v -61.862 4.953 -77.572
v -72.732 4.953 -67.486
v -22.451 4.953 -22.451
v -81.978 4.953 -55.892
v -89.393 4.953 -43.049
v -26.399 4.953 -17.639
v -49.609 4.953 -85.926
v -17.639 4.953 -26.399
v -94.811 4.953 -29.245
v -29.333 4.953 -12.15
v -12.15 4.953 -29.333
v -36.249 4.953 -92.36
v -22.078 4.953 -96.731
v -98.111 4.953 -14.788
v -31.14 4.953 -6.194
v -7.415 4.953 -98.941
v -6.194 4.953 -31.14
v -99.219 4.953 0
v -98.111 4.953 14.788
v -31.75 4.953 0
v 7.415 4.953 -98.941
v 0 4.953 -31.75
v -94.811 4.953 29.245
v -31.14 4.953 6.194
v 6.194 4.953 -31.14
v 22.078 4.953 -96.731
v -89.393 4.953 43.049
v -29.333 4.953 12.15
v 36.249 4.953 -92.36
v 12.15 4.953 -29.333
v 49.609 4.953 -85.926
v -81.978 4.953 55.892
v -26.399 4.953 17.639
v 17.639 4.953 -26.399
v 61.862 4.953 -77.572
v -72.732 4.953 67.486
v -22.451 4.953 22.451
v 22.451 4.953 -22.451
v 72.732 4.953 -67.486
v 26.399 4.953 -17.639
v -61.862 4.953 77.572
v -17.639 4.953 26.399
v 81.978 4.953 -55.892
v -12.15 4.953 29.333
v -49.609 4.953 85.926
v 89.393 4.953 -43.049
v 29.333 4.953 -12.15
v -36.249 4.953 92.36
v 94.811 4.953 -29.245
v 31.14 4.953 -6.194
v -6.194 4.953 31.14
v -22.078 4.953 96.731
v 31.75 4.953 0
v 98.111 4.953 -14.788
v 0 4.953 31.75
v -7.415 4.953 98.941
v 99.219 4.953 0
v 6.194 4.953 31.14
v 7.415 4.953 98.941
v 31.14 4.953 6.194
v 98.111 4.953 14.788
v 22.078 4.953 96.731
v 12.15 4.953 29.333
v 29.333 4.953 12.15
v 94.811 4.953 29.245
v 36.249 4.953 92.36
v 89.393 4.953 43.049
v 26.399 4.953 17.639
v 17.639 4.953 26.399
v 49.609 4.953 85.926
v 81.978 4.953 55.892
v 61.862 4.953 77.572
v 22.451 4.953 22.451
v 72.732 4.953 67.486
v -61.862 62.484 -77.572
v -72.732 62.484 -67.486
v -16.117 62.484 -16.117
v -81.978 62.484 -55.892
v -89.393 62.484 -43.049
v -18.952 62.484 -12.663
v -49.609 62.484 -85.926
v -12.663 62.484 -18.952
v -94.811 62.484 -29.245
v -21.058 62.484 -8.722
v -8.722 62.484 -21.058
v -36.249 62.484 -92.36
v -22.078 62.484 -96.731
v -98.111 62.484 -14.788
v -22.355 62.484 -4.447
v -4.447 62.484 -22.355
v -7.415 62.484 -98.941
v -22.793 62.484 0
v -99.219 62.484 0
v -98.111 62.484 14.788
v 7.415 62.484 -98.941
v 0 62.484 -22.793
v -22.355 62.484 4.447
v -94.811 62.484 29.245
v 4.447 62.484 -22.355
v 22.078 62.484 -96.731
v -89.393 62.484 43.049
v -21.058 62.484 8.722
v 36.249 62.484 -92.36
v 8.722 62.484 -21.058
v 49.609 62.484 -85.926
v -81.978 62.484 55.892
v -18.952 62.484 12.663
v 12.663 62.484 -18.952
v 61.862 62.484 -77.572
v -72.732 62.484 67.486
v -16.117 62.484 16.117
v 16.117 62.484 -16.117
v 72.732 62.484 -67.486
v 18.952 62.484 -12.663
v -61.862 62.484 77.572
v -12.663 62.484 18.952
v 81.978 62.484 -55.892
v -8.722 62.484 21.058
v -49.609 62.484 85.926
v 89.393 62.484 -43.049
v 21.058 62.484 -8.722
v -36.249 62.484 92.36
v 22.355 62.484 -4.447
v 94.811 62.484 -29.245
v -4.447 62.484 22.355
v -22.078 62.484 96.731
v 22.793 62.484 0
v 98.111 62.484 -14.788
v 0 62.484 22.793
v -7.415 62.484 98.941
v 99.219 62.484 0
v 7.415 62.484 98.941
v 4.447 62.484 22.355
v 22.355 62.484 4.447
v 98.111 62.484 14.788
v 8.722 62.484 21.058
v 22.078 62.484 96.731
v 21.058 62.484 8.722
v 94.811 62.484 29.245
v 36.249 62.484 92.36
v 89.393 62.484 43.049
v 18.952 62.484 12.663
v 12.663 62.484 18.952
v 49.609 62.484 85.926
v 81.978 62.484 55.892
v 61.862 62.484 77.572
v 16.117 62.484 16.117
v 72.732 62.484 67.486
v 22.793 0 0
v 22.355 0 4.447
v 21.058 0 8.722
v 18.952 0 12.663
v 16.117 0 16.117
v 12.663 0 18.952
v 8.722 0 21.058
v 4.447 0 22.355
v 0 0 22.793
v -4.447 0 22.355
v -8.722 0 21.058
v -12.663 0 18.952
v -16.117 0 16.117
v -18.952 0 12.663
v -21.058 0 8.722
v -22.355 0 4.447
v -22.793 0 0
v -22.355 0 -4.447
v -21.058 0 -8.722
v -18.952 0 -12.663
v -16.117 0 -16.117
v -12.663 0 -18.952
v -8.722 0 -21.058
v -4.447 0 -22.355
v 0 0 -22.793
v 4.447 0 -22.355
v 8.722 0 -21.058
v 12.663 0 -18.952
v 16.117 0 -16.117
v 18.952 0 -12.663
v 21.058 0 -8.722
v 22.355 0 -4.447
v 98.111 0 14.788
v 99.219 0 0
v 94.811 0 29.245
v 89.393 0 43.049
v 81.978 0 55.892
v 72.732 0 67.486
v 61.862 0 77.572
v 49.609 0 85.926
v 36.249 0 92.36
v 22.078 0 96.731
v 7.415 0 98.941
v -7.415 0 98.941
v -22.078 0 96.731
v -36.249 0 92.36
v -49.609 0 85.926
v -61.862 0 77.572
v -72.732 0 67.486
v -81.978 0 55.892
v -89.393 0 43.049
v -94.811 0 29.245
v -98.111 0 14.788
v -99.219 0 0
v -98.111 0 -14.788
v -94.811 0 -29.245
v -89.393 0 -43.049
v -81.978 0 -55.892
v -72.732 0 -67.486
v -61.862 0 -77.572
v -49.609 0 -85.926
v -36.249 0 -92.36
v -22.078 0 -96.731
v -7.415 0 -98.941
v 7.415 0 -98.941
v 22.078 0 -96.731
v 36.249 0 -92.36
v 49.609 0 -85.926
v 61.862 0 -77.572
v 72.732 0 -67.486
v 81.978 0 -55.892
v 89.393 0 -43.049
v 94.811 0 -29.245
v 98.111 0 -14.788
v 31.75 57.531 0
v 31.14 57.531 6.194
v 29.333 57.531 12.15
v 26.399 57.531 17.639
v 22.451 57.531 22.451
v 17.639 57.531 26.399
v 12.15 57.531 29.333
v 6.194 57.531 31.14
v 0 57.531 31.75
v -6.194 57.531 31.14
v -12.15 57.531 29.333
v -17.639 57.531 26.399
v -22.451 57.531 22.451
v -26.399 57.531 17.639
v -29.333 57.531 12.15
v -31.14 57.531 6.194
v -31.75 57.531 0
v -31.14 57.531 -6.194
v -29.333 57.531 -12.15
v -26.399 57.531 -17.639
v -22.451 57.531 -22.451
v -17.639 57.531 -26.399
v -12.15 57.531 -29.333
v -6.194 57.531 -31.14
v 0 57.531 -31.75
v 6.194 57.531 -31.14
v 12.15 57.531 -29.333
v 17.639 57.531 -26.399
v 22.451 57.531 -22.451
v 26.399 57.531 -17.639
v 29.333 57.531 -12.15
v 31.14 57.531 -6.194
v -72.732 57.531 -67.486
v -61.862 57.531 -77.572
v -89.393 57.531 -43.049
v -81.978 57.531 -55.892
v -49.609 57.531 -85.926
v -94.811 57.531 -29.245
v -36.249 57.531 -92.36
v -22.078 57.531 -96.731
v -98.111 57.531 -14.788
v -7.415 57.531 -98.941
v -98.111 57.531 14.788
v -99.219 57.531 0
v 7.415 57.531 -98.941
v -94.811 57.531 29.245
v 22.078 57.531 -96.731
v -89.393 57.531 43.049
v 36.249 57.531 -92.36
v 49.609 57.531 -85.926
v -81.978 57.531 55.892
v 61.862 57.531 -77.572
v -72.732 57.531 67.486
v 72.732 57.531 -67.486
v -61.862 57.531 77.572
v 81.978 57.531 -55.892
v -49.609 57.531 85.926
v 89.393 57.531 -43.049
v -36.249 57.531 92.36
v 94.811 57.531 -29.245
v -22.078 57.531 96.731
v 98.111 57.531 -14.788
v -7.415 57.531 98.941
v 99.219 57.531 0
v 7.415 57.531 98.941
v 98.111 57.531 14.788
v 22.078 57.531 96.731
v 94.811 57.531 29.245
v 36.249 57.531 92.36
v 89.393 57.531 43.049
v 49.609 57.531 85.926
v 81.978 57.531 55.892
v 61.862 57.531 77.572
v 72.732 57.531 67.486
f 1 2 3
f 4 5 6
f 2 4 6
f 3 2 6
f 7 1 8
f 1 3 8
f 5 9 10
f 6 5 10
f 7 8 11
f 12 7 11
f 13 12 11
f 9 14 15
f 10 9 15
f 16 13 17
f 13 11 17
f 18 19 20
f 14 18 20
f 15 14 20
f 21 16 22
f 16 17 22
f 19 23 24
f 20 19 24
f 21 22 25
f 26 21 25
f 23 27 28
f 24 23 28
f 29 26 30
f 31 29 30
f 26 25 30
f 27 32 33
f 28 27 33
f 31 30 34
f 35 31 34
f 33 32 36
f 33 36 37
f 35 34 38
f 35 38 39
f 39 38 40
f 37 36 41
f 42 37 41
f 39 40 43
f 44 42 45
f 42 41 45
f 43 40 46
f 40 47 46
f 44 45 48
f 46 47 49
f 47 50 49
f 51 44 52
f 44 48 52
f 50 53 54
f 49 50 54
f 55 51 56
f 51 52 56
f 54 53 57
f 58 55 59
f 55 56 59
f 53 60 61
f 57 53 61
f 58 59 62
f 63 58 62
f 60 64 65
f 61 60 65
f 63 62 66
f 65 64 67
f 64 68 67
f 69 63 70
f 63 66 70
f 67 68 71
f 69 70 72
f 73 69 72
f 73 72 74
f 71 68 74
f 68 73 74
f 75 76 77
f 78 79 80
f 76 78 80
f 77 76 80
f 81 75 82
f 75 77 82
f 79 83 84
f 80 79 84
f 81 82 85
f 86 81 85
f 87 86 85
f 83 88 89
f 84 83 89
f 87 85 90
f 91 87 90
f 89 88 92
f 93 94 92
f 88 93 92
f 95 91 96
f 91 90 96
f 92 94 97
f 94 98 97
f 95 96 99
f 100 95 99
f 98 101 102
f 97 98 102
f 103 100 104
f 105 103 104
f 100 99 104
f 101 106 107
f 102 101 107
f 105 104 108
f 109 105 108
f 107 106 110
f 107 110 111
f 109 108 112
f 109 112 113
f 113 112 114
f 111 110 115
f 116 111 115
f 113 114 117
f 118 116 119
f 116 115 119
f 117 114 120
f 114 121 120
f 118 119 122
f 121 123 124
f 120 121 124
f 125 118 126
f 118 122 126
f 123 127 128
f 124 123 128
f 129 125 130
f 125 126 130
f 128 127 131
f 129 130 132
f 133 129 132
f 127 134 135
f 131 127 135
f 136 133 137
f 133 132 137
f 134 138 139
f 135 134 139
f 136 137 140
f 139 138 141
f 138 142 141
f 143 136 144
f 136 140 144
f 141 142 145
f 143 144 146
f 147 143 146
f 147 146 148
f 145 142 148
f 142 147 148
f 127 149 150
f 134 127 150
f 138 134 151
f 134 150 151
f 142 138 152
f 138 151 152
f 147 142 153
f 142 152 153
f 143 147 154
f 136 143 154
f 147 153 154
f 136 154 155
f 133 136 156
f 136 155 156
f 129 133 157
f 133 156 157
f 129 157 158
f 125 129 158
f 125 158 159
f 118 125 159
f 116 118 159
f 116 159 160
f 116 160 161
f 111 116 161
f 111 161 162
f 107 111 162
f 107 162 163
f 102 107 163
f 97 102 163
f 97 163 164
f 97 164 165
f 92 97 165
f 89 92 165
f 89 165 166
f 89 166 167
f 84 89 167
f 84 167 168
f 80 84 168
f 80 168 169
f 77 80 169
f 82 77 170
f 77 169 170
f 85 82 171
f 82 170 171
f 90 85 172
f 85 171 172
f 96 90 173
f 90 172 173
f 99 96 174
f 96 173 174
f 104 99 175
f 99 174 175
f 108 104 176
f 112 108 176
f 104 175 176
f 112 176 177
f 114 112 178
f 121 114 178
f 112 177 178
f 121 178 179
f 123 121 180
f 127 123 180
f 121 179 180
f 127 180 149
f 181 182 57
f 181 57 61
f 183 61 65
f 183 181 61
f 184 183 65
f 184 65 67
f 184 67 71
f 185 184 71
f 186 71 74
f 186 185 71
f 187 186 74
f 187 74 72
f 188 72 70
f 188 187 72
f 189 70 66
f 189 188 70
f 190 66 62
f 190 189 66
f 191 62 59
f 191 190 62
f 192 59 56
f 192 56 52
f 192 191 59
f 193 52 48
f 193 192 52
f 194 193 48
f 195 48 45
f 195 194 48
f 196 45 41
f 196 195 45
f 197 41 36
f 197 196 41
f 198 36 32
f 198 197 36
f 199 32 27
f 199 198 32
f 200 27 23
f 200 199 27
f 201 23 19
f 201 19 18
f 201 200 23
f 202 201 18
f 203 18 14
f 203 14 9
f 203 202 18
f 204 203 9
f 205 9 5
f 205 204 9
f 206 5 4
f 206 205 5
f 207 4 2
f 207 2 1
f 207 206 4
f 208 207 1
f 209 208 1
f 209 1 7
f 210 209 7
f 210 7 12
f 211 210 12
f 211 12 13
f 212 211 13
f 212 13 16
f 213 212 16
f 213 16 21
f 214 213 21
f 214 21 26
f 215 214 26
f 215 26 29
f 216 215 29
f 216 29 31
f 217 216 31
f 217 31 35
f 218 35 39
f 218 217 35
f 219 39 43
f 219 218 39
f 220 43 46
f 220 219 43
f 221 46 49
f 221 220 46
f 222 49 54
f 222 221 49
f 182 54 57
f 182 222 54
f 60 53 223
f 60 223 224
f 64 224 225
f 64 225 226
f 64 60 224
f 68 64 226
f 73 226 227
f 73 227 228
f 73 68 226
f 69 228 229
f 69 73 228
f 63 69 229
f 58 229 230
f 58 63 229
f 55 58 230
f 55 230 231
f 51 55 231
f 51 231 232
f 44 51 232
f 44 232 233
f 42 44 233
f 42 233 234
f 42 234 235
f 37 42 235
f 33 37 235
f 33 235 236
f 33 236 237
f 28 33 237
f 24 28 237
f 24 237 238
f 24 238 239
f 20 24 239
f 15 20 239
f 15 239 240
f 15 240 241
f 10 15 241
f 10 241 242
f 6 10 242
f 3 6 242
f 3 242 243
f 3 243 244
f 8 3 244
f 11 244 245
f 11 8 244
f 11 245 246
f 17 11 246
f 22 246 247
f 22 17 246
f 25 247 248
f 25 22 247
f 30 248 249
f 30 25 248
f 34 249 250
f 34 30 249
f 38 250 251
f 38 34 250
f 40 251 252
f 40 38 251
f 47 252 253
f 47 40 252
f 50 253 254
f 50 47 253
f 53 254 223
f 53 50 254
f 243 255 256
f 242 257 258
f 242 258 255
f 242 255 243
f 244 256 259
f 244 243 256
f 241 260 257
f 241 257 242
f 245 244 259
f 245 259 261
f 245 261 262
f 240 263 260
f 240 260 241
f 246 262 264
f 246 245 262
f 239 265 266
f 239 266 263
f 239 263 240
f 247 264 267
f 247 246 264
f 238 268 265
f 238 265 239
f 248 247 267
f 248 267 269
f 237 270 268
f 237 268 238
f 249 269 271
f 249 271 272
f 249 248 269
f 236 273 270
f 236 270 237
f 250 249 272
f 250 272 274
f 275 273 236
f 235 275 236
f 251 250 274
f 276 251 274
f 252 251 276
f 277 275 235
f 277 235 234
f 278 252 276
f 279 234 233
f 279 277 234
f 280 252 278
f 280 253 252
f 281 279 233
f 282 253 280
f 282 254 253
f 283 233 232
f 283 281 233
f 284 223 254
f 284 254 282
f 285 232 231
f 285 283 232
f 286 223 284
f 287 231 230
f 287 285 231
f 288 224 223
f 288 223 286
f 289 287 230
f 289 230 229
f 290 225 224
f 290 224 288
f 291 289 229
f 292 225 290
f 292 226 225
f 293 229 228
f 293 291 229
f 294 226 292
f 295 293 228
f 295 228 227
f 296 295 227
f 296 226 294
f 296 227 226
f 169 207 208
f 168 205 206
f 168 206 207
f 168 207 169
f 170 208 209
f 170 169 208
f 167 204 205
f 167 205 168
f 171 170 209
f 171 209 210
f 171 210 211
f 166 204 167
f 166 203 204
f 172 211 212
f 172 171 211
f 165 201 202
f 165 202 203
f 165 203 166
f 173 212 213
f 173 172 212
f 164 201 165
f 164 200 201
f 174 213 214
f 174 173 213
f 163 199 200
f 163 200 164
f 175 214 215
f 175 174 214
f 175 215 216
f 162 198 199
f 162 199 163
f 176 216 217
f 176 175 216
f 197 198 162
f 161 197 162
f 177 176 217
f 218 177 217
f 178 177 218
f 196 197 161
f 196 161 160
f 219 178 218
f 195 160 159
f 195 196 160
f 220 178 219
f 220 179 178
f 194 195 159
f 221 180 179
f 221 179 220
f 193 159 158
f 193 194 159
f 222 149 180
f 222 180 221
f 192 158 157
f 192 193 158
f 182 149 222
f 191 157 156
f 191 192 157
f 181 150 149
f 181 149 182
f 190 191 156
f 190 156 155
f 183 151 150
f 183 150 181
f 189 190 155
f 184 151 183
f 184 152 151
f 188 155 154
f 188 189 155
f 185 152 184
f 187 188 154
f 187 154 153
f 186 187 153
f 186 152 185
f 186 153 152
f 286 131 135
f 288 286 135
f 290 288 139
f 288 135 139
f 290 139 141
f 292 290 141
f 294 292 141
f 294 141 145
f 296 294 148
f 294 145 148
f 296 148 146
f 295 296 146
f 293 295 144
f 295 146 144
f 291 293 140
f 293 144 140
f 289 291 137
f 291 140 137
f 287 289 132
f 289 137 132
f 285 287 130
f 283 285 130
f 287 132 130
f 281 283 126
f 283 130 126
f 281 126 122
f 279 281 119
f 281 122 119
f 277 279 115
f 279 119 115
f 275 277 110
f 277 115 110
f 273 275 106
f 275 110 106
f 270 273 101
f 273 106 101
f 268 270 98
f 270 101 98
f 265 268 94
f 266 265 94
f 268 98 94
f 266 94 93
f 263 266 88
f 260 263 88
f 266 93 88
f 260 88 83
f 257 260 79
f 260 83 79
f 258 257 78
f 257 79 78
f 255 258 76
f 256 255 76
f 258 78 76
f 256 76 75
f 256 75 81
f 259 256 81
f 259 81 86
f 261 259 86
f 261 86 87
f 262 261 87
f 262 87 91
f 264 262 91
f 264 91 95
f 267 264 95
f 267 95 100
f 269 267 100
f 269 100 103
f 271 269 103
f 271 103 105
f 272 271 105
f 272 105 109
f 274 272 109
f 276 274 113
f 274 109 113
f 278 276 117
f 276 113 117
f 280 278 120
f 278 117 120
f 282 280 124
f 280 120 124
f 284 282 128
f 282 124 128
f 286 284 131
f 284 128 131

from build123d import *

# Parameters (mm, degrees)
F0_R     = 99.21875
F1_DEPTH = 4.953
F4_R     = 31.75
F5_DEPTH = 62.23
F3_R     = 99.21875
F6_DEPTH = 4.953
F7_R     = 22.792955
F8_DEPTH = 62.485


with BuildPart() as f1:
    # F0 (on Front) → F1 (new body)
    with BuildSketch(Plane.XZ):
        Circle(F0_R)
    extrude(amount=-F1_DEPTH)

    # F4 (on face) → F5 (join)
    with BuildSketch(Plane.XZ):
        Circle(F4_R)
    extrude(amount=-F5_DEPTH)

    # F3 (on offset) → F6 (join)
    with BuildSketch(Plane.XZ.offset(-62.484)):
        Circle(F3_R)
    extrude(amount=F6_DEPTH)

    # F7 (on face) → F8 (cut, through all)
    with BuildSketch(Plane.XZ):
        Circle(F7_R)
    extrude(amount=-F8_DEPTH, mode=Mode.SUBTRACT)


solid = f1.part
